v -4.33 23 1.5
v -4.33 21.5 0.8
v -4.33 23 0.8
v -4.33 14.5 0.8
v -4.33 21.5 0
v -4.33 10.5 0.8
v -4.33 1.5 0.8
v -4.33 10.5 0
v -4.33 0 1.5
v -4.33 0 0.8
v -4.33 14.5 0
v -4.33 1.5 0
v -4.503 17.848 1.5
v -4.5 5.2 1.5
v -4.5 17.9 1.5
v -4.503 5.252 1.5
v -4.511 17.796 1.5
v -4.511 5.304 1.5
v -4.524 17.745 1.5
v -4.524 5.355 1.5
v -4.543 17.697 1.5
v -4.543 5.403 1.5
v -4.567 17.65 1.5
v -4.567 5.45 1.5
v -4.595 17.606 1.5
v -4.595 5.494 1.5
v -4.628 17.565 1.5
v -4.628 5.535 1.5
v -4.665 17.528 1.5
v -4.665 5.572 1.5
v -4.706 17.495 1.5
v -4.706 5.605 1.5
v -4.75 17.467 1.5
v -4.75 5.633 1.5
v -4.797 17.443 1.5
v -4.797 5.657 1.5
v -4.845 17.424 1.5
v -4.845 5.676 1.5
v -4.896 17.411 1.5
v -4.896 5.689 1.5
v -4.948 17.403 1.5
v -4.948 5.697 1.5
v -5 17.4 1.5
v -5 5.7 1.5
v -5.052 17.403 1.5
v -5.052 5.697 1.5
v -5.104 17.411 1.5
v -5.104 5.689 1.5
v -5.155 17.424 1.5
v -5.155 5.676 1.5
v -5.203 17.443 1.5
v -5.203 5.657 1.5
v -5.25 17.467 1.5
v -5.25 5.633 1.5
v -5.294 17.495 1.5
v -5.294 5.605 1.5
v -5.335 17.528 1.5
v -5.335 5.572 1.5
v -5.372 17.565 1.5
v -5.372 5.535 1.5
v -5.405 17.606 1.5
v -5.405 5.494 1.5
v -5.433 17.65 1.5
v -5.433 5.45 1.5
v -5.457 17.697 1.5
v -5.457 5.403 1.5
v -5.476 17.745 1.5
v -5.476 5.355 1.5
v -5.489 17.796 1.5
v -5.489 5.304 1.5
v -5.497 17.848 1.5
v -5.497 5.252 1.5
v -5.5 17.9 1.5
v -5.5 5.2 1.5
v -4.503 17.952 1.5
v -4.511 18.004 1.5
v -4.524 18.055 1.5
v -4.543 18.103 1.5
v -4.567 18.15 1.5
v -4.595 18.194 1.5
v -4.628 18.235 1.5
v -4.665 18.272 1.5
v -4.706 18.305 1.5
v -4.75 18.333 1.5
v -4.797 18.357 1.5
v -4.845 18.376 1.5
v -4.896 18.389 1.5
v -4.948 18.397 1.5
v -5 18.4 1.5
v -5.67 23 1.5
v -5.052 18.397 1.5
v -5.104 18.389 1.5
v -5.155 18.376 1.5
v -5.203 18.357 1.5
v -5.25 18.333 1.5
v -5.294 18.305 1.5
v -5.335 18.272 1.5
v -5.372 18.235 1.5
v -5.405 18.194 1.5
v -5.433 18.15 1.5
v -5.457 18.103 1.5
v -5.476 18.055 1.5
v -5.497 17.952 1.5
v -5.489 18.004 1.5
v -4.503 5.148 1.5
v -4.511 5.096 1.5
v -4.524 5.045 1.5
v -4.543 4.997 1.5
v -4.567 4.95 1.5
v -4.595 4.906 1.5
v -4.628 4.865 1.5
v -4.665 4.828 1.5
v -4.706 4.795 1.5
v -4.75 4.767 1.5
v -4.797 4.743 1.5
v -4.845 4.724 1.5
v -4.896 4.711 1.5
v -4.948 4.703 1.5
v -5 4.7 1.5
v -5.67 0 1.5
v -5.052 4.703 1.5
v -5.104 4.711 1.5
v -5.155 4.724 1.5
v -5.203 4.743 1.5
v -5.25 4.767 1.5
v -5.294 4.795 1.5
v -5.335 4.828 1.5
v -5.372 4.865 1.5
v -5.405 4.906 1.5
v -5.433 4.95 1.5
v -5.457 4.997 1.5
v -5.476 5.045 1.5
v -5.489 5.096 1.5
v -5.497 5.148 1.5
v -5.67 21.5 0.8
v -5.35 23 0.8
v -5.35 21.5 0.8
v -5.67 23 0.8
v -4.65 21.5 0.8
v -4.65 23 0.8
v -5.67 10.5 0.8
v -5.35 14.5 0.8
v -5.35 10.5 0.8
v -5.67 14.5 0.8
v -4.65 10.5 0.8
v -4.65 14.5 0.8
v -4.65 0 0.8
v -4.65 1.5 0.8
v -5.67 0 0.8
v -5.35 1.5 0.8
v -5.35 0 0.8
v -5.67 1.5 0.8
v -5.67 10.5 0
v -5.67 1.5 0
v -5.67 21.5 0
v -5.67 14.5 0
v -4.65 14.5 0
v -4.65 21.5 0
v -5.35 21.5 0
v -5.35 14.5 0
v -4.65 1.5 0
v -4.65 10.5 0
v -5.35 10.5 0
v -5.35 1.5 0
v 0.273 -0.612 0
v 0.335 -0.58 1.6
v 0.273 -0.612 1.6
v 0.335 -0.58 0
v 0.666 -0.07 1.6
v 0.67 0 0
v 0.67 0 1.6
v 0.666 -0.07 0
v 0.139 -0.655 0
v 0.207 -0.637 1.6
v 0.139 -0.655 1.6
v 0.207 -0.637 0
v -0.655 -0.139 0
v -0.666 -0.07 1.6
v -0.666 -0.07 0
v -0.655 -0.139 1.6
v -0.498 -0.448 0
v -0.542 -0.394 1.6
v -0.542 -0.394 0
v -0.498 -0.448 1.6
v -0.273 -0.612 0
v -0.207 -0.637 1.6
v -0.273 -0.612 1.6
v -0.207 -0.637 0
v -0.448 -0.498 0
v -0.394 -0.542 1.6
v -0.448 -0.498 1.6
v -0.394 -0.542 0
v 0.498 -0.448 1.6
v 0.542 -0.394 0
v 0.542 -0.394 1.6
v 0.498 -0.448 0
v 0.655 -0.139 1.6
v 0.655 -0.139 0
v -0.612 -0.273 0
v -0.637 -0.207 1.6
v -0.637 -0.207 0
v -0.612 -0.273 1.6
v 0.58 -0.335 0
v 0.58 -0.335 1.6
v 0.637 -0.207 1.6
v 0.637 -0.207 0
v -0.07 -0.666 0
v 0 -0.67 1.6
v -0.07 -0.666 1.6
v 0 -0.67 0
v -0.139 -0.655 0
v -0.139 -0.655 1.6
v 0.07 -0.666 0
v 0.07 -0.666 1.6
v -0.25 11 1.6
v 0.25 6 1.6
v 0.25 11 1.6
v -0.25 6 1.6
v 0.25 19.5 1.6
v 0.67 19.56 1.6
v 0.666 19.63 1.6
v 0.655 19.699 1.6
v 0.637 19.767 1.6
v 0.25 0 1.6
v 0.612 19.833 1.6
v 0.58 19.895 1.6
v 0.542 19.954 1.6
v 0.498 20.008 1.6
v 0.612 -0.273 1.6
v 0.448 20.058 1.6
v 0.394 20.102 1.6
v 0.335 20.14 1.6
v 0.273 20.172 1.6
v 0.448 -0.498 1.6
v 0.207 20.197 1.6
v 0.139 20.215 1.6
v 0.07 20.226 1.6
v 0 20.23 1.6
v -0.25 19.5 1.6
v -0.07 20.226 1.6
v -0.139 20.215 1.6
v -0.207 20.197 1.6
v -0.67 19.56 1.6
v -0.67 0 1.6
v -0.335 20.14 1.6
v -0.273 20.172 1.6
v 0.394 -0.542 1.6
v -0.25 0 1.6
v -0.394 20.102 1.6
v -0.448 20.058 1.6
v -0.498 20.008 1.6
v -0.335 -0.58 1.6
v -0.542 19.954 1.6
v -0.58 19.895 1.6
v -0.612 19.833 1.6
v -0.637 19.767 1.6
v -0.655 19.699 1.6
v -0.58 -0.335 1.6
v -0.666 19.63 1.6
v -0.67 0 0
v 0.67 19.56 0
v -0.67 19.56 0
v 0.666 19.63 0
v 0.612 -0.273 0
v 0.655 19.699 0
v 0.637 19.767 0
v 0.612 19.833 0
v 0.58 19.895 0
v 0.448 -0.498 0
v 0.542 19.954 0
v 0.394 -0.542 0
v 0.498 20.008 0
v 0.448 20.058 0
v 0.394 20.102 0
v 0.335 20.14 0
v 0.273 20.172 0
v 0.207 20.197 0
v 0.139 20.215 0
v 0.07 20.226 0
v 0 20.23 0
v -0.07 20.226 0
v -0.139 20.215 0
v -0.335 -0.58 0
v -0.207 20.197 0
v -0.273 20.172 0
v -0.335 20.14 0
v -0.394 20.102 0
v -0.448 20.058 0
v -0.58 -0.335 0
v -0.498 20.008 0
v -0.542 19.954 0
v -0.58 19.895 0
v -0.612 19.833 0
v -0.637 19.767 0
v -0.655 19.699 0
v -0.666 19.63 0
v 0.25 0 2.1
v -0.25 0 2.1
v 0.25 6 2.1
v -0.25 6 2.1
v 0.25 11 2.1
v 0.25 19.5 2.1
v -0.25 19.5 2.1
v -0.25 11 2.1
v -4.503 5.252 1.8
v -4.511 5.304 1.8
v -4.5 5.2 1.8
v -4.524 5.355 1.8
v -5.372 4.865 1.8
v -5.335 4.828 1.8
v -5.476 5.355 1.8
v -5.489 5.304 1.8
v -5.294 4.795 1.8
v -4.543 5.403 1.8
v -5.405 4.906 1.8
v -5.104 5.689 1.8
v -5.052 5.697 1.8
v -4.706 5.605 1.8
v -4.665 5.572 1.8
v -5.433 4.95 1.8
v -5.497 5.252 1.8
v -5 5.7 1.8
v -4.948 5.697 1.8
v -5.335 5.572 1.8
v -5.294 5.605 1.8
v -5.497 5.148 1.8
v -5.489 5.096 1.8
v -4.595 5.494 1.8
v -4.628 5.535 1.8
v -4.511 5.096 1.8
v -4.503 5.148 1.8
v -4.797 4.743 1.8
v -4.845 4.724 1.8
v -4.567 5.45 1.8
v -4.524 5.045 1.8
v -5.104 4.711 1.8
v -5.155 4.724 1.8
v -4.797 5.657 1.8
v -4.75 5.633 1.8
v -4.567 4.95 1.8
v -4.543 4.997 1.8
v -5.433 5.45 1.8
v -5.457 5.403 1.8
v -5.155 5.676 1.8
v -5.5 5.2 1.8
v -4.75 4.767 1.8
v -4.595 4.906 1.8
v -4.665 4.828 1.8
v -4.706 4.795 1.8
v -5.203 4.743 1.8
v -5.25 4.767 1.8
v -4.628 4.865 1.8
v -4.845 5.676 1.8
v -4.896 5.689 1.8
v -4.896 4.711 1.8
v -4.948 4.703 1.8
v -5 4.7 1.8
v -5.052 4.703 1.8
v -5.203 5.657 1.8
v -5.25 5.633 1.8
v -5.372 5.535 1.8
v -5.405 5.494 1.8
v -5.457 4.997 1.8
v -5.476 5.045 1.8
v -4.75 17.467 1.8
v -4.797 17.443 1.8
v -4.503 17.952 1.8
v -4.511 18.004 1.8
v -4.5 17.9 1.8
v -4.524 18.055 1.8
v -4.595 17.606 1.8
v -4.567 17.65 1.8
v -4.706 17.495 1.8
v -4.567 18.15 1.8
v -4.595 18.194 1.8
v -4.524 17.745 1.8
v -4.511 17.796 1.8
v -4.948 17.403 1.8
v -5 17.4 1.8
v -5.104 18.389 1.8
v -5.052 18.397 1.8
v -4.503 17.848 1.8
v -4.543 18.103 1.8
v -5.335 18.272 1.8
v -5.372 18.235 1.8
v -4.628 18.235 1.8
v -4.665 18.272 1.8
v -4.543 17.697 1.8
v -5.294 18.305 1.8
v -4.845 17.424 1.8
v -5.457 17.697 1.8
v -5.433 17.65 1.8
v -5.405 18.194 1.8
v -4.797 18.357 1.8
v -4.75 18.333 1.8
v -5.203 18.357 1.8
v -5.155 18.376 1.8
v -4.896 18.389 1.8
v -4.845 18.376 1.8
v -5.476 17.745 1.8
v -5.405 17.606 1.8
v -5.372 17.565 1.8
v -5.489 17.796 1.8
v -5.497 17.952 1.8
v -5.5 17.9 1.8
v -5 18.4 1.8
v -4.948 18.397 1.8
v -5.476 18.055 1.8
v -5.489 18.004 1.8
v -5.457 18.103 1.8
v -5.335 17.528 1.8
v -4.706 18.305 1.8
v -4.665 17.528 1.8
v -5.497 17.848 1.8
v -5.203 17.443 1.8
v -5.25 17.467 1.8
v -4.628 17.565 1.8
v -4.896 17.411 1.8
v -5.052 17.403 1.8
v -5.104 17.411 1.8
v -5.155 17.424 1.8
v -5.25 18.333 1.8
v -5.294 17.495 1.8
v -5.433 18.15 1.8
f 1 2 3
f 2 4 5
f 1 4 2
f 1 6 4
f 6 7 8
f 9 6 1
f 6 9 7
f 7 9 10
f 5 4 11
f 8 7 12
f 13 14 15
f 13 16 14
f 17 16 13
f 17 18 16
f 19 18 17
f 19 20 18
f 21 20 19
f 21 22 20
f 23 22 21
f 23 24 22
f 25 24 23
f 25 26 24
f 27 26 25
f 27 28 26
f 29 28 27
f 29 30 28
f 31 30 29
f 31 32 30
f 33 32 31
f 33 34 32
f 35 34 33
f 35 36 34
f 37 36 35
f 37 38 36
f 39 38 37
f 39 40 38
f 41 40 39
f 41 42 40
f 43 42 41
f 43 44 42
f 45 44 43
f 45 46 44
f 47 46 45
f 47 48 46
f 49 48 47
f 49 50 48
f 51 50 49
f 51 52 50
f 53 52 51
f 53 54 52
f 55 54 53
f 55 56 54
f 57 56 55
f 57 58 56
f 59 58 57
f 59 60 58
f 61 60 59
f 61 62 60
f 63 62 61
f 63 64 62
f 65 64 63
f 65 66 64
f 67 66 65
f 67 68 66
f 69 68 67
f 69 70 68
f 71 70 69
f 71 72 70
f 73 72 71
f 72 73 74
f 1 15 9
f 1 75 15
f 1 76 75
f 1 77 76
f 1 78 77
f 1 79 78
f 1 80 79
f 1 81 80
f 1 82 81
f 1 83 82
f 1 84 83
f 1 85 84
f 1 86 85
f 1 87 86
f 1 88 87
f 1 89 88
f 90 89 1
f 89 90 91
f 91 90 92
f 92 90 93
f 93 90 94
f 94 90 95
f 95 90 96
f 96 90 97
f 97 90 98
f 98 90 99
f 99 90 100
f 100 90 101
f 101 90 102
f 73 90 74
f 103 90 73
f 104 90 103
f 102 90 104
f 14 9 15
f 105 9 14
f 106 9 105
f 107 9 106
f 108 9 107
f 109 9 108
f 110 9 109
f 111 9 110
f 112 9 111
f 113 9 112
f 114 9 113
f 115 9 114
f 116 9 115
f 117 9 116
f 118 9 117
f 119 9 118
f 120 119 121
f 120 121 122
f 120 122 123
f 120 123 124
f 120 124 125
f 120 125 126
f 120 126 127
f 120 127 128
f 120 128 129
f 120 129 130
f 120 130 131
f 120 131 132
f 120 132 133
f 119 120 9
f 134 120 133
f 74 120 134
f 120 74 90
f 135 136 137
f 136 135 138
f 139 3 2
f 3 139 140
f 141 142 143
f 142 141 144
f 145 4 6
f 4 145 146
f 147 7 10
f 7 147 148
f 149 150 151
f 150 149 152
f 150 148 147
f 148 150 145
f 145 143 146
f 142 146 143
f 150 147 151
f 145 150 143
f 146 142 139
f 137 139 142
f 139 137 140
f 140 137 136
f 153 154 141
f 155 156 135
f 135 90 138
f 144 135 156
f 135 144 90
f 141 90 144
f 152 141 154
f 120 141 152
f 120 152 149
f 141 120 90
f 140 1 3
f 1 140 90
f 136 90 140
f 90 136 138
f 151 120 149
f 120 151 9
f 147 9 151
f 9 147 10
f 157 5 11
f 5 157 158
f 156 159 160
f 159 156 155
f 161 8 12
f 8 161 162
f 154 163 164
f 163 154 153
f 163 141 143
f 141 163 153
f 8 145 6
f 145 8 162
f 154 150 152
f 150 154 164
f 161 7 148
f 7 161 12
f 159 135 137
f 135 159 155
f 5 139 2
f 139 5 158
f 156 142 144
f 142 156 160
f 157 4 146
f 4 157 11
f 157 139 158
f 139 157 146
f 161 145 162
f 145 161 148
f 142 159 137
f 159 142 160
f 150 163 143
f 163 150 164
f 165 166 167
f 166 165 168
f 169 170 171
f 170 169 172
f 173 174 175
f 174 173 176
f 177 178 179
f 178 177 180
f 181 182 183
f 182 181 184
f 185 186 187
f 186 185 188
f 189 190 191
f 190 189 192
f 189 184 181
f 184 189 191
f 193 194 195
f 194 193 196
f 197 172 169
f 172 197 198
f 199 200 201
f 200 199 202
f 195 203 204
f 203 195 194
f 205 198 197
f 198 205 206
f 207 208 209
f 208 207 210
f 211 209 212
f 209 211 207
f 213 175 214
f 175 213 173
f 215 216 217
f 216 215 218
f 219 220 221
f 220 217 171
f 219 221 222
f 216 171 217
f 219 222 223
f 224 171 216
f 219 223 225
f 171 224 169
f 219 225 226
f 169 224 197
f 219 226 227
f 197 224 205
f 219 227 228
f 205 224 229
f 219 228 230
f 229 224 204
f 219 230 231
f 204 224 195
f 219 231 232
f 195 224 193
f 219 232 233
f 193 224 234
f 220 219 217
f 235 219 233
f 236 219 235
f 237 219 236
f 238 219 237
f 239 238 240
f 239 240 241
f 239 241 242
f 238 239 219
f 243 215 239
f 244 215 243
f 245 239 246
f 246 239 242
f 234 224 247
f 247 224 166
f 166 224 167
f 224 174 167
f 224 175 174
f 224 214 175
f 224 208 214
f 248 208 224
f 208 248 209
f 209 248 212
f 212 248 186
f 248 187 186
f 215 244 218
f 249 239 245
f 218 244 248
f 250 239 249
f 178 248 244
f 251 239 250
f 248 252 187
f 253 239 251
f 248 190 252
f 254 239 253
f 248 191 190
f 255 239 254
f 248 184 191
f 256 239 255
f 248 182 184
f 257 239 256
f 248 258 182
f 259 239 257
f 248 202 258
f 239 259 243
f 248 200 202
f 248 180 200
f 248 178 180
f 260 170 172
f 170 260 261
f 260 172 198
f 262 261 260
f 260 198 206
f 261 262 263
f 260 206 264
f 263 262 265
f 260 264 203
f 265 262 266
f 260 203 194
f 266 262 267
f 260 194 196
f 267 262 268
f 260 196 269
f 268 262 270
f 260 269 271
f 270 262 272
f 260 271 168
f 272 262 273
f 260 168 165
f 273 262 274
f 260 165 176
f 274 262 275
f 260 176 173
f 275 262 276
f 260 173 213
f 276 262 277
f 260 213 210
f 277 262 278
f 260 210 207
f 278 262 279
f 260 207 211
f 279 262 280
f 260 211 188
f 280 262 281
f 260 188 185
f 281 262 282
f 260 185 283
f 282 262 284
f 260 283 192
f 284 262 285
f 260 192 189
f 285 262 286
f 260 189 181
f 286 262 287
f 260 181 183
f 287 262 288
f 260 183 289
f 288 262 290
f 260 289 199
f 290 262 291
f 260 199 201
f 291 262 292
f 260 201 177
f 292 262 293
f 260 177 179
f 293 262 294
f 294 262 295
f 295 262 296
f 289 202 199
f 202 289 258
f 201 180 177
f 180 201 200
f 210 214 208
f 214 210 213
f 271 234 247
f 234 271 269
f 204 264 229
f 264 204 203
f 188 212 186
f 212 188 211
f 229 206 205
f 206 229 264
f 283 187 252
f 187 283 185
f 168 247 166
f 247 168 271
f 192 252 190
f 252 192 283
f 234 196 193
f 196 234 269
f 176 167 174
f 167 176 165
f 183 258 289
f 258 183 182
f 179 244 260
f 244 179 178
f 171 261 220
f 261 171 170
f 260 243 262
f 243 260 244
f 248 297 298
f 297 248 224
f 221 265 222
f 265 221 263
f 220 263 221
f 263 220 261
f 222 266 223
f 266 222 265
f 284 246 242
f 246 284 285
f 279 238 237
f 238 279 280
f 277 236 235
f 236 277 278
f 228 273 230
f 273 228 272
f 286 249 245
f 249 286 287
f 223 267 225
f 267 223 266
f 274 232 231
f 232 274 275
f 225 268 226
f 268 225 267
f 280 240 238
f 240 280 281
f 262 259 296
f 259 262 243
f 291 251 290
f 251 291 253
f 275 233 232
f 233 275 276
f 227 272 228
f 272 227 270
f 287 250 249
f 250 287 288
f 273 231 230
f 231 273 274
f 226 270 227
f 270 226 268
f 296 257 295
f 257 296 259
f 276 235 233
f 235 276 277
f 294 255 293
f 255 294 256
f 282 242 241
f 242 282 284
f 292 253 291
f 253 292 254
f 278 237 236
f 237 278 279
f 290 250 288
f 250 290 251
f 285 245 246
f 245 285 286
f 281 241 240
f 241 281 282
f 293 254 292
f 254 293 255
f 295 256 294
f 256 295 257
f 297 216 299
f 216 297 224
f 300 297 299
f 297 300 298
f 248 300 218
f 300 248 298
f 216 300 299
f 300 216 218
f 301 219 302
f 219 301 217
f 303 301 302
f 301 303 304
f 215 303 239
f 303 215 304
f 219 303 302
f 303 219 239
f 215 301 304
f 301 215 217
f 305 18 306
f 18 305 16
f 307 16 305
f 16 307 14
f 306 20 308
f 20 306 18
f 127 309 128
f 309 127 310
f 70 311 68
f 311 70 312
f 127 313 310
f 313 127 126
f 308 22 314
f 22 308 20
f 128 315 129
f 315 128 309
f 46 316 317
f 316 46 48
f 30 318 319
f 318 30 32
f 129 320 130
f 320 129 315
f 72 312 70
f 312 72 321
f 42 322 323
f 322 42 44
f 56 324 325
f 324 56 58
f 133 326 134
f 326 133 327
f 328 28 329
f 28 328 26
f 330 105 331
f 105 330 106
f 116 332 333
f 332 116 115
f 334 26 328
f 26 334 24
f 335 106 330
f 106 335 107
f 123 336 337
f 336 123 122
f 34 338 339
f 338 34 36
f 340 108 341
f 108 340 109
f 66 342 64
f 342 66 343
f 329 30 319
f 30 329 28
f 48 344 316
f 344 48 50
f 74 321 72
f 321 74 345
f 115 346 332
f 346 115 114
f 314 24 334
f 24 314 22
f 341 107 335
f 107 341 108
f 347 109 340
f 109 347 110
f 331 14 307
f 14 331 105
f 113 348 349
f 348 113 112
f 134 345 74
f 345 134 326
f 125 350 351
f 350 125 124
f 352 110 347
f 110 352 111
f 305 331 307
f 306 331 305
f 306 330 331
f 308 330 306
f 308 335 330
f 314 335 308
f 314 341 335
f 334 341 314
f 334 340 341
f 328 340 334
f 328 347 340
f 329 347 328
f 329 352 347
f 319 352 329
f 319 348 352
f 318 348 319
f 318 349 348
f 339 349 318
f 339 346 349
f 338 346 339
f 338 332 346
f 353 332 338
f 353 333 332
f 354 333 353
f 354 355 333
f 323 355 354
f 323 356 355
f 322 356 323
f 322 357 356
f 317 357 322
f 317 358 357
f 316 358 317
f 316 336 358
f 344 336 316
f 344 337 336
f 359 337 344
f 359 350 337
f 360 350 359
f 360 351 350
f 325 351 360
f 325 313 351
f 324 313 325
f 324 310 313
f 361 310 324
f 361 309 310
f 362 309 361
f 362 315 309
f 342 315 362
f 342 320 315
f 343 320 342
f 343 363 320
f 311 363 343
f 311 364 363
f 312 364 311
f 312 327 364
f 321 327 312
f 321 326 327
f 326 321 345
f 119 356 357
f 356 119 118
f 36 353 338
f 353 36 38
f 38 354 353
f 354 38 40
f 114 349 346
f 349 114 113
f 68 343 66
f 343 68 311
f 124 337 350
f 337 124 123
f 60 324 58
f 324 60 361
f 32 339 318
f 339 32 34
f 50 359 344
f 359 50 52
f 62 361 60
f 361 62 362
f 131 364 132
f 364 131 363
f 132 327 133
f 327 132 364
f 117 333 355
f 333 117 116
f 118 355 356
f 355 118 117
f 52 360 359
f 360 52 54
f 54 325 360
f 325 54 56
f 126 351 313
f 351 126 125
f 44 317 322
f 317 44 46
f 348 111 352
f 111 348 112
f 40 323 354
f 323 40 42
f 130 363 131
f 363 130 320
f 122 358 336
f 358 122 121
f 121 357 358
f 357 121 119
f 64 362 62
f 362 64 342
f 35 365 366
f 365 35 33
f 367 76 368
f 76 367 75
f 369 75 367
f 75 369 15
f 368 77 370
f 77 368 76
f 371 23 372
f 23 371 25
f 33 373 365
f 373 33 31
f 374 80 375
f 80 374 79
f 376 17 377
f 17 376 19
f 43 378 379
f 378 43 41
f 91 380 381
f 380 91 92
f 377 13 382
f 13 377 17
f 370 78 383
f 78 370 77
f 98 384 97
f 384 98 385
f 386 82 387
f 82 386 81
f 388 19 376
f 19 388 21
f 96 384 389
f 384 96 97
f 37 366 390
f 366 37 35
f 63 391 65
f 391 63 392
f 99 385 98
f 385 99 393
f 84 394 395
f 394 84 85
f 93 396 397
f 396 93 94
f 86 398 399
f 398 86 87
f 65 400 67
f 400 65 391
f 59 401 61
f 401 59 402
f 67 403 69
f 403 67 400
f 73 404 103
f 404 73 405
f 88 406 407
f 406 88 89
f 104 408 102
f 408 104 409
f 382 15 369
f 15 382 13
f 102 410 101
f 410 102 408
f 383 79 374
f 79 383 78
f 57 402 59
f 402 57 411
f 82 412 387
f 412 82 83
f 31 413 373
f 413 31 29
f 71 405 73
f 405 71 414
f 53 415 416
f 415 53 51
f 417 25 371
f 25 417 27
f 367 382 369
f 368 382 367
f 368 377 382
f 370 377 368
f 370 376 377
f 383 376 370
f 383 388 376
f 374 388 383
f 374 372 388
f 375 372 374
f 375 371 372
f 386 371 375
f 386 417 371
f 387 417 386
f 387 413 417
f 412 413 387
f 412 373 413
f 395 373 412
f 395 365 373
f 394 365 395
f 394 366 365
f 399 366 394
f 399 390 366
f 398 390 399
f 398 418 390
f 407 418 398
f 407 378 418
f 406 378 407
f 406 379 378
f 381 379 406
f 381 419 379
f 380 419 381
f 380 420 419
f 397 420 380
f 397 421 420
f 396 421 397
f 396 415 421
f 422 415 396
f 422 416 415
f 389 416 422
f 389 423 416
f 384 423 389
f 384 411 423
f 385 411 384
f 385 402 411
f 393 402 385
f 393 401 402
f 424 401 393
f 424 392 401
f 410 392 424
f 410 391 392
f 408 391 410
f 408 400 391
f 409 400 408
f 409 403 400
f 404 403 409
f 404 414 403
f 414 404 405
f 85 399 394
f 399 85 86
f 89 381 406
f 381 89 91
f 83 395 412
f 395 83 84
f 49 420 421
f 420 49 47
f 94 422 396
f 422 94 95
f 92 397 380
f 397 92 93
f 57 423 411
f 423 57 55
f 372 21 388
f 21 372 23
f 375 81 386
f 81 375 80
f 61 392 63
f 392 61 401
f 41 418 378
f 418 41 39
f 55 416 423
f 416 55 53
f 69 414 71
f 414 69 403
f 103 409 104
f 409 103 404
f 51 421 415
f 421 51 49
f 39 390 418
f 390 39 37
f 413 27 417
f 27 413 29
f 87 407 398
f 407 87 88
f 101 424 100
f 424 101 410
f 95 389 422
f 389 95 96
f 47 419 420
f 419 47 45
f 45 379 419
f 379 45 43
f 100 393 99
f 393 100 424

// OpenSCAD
/*OnePlus2
Lauter leiser taster für menschen die Aufgrund des mießen designs die tasten verlohren haben.
1.den Druck Trocken zusammen setzen und ins smartphone einsetzen um zu kucken obs passt. gegebenfalls nacharbeiten.

2.in die nut Kleber geben und beide teile fest vereinen.





//tiefe für buttons: 3.32 mm
//leiser: 10 mm
//lauter: 8 mm
//halterung: 0,5mm 
//dicke, oben: 1,8 mm
//höhe obere fläche: 1 mm
//höhe mit knopf (ges. höhe): 3,2 mm */

$fn=60;
//cube([2, 20.9, 2]);
//difference(){
 //   cube([0.5, 28,0.5])
 
 //Grundkörper Male
  cylinder(h = 1.6, r = 0.67);//}
translate([-0.67, 0, 0]) {
cube([1.34, 19.56, 1.6]); }
translate([0, 19.56, 0]) {
cylinder(h = 1.6, r = 0.67); }

//erste Stufe
translate([-0.25,0,1.6]) {
cube([0.5, 6, 0.5]); }
//zweite Stufe
translate([-0.25,11,1.6]) {
cube([0.5, 8.5, 0.5]); }


//Gundkörper female

difference(){
union() {
translate([-5.67, 0, 0.8]) {
cube([1.34, 23, 0.7]); }
//erste Stufe
translate([-5.67,1.5,0]) {
cube([1.34, 9, 0.8]); }
//zweite stufe
translate([-5.67, 14.5,0]) {
cube([1.34, 7, 0.8]); }}
//nut
translate([-5.35, 0,0]) {
cube([0.7, 23, 0.8]); }
}
//Drückbolzen
translate([-5, 5.2, 1.5]){
cylinder(0.3, r = 0.5, center=false);}
translate([-5, 17.9, 1.5]){
cylinder(0.3, r = 0.5, center=false);}
